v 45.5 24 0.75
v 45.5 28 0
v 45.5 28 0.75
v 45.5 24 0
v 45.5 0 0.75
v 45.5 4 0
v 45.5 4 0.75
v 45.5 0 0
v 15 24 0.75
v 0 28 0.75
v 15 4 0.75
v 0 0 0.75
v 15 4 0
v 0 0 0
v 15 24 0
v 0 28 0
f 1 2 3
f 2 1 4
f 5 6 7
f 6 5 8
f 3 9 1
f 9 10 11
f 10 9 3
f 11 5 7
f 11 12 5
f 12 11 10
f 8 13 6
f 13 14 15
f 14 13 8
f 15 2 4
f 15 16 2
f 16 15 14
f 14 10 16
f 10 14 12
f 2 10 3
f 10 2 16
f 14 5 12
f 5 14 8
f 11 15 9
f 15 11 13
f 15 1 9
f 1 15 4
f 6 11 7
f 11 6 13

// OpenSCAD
/*
    Projekt Name: Trennwaende fuer das Modellhaus 3723
    Modul:  Wand Ostseite
    Projekt URL: https://github.com/Hardi-St/MobaLedLib_Docu/tree/master/3D_Daten_fuer_die_MobaLedLib/Trennwände%20für%20Häuser
    Version: 0.0.1
    Autor: Moba-Nick (mobanick@wp12085804.server-he.de)
    Lizenz: CC-BY-SA-4.0 (https://creativecommons.org/licenses/by-sa/4.0/legalcode.de)
*/
//  Alle Angaben sind immer in mm bei meinen Projekten.
//  Parameter fuer die Wand
x_all = 45.5;  //Breite der Wand = Breite der Grundplatte
z_all = 0.75; //Wandstaerke gibnt an, wie Dick die Wand ist. 0.75 ist dick genug um kein Licht durchzulassen, aber duenn genug um Material zu sparen.
y_erdgeschoss = 28;     //Hoehe Erdgeschoss 

difference(){
    HauptWand(2);
    
    // Schaufenster
    Fenster(x_all/2-(3+12),4.00,x_all-(3+12),y_erdgeschoss - 4- 2-2);
    
    // Tuer
    //Fenster(x_all/2-3,2.00,12,y_erdgeschoss - 4- 2);
}

// Lichtwand für Hausecke
translate([0,0,0]){
    //cube([z_all,y_erdgeschoss,9],false);
}

// Balken zwischen Tuer und Fenster zur Stabilisierung
translate([14.5,0,0]){
    //cube([z_all,y_erdgeschoss,z_all],false);
}

// Lichtschutz für Schaufenster und Obergeschoss
translate([x_all/2-0.5-6,y_erdgeschoss-z_all,]){
    //cube([x_all-(3+12)-5.75,z_all,5.75],false);
}


/* 
!!!!!!!!!!!!!!!!!!!!!!!!!!!!!!!!!!!!!!!!!!!!!!!!!!!!!!!!!!!!!!!!!!!    
!!!!    Ab hier kommen die Module. Bitte nur aendern wann man   !!!!
!!!!    weiss was man macht.                                    !!!!
!!!!!!!!!!!!!!!!!!!!!!!!!!!!!!!!!!!!!!!!!!!!!!!!!!!!!!!!!!!!!!!!!!!
/*  
    Das Module HauptWand erstellt die Wand des Hauses inkl. der Dachschraege aus einen Polyhydron. Dazu wurde im Bereich fuer die Parameter in den  Zeilen 10 - 14 die Werte fuer die Breite der Wand (x_all) sowie die Höhe des Erdgeschosses (y_erdgeschoss) und des oberen Stockwerks (y_dachschraege) angeben.
*/

module HauptWand(typ){
  if (typ == 1){    //mit Dachschräge
        //  PolyPunkte gibt an wo sicher welcher Punkt befindet. 
        //  Die Korrdinaten werden immer im Format [x,y,z] uebergeben.
        PolyPunkte = [
        [0,0,0],    // 0
        [0,y_erdgeschoss,0],    // 1
        [x_all/2,y_all,0],    // 2
        [x_all,y_erdgeschoss,0],    // 3
        [x_all,0,0],    // 4
        [0,0,z_all],    // 5
        [x_all,0,z_all],    // 6
        [x_all,y_erdgeschoss,z_all],    // 7
        [x_all/2,y_all,z_all],    // 8
        [0,y_erdgeschoss,z_all]];    // 9
        
        //  PolyFlaechen gibt an welche Punkte welche Flaechen beschreiben. 
        //  Die Korrdinaten werden immer im Format [x,y,z] uebergeben.
        PolyFlaechen =[
        [0,1,2,3,4],    // Unten (Boden)
        [5,0,4,6],      // Vorne (vordere Kante)
        [6,4,3,7],      // Rechts unten (Erdgeschoss)
        [7,3,2,8],      // Rechts oben  (Dachgeschoss/Dachschraege)
        [6,7,8,9,5],    // Oben (Deckel)
        [9,1,0,5],      // Links unten  (Erdgeschoss)
        [8,2,1,9]];     // Links oben   (Dachgeschoss/Dachschraege)
          
        polyhedron( PolyPunkte, PolyFlaechen );
    }else if (typ == 2){    //normale Wand ohne Dach
        cube([x_all,y_erdgeschoss,z_all],false);
    }else{
        
    }
}

/*  
    Das Module Fenster erstellt wie der Name schon sagt, die Ausschnitte fuer die Fenster.
    Dabei gibt es 4 Variablen die uebergeben werden.
    "pos_x" gibt die Startposition des linken unteren Ecke im Bezug zur Mittelachse des Hauses an.
    "pos_y" gibt die Startposition der inken untren Ecke im Bezug zur Grundplatte an.
    "size_x" gibt die Breite des Fensters an
    "size_y" gibt die Hoehe des Fensters an
    Beispiel: Der Befehl "Fenster(10,20,15,10);" erzeugt ein Fenster 10mm von der Mitte nach Rechts, auf der Hoehe von 20mm mit einer Breite von 15mm und einer Hoehe von 10mm;
*/
module Fenster(pos_x, pos_y, size_x, size_y){
    translate([x_all/2-pos_x, pos_y, 0]){
        cube([size_x,size_y,z_all*1.25],false);
    }
}

/*  
    Das Module Fenster_rund erstellt wie der Name schon sagt, die Ausschnitte fuer die Fenster mit rundem Ausschnitt.
    Dabei gibt es 3 Variablen die uebergeben werden.
    "pos_x" gibt die Startposition der linken unteren Ecke im Bezug zur Mittelachse des Hauses an.
    "pos_y" gibt die Startposition der inken unteren Ecke im Bezug zur Grundplatte an.
    "size_x" gibt die Breite des Fensters an
    Beispiel: Der Befehl "Fenster_rund(10,20,5);" erzeugt ein Fenster 10mm von der Mitte nach Rechts, auf der Hoehe von 20mm mit einem Durchmesser von 5mm;
*/
module Fenster_Rund(pos_x, pos_y, size_x){
    
    translate([x_all/2+pos_x+size_x/2, pos_y+size_x/2, 0]){
        cylinder(h=z_all*1.25,d=size_x,false);
    }
}
